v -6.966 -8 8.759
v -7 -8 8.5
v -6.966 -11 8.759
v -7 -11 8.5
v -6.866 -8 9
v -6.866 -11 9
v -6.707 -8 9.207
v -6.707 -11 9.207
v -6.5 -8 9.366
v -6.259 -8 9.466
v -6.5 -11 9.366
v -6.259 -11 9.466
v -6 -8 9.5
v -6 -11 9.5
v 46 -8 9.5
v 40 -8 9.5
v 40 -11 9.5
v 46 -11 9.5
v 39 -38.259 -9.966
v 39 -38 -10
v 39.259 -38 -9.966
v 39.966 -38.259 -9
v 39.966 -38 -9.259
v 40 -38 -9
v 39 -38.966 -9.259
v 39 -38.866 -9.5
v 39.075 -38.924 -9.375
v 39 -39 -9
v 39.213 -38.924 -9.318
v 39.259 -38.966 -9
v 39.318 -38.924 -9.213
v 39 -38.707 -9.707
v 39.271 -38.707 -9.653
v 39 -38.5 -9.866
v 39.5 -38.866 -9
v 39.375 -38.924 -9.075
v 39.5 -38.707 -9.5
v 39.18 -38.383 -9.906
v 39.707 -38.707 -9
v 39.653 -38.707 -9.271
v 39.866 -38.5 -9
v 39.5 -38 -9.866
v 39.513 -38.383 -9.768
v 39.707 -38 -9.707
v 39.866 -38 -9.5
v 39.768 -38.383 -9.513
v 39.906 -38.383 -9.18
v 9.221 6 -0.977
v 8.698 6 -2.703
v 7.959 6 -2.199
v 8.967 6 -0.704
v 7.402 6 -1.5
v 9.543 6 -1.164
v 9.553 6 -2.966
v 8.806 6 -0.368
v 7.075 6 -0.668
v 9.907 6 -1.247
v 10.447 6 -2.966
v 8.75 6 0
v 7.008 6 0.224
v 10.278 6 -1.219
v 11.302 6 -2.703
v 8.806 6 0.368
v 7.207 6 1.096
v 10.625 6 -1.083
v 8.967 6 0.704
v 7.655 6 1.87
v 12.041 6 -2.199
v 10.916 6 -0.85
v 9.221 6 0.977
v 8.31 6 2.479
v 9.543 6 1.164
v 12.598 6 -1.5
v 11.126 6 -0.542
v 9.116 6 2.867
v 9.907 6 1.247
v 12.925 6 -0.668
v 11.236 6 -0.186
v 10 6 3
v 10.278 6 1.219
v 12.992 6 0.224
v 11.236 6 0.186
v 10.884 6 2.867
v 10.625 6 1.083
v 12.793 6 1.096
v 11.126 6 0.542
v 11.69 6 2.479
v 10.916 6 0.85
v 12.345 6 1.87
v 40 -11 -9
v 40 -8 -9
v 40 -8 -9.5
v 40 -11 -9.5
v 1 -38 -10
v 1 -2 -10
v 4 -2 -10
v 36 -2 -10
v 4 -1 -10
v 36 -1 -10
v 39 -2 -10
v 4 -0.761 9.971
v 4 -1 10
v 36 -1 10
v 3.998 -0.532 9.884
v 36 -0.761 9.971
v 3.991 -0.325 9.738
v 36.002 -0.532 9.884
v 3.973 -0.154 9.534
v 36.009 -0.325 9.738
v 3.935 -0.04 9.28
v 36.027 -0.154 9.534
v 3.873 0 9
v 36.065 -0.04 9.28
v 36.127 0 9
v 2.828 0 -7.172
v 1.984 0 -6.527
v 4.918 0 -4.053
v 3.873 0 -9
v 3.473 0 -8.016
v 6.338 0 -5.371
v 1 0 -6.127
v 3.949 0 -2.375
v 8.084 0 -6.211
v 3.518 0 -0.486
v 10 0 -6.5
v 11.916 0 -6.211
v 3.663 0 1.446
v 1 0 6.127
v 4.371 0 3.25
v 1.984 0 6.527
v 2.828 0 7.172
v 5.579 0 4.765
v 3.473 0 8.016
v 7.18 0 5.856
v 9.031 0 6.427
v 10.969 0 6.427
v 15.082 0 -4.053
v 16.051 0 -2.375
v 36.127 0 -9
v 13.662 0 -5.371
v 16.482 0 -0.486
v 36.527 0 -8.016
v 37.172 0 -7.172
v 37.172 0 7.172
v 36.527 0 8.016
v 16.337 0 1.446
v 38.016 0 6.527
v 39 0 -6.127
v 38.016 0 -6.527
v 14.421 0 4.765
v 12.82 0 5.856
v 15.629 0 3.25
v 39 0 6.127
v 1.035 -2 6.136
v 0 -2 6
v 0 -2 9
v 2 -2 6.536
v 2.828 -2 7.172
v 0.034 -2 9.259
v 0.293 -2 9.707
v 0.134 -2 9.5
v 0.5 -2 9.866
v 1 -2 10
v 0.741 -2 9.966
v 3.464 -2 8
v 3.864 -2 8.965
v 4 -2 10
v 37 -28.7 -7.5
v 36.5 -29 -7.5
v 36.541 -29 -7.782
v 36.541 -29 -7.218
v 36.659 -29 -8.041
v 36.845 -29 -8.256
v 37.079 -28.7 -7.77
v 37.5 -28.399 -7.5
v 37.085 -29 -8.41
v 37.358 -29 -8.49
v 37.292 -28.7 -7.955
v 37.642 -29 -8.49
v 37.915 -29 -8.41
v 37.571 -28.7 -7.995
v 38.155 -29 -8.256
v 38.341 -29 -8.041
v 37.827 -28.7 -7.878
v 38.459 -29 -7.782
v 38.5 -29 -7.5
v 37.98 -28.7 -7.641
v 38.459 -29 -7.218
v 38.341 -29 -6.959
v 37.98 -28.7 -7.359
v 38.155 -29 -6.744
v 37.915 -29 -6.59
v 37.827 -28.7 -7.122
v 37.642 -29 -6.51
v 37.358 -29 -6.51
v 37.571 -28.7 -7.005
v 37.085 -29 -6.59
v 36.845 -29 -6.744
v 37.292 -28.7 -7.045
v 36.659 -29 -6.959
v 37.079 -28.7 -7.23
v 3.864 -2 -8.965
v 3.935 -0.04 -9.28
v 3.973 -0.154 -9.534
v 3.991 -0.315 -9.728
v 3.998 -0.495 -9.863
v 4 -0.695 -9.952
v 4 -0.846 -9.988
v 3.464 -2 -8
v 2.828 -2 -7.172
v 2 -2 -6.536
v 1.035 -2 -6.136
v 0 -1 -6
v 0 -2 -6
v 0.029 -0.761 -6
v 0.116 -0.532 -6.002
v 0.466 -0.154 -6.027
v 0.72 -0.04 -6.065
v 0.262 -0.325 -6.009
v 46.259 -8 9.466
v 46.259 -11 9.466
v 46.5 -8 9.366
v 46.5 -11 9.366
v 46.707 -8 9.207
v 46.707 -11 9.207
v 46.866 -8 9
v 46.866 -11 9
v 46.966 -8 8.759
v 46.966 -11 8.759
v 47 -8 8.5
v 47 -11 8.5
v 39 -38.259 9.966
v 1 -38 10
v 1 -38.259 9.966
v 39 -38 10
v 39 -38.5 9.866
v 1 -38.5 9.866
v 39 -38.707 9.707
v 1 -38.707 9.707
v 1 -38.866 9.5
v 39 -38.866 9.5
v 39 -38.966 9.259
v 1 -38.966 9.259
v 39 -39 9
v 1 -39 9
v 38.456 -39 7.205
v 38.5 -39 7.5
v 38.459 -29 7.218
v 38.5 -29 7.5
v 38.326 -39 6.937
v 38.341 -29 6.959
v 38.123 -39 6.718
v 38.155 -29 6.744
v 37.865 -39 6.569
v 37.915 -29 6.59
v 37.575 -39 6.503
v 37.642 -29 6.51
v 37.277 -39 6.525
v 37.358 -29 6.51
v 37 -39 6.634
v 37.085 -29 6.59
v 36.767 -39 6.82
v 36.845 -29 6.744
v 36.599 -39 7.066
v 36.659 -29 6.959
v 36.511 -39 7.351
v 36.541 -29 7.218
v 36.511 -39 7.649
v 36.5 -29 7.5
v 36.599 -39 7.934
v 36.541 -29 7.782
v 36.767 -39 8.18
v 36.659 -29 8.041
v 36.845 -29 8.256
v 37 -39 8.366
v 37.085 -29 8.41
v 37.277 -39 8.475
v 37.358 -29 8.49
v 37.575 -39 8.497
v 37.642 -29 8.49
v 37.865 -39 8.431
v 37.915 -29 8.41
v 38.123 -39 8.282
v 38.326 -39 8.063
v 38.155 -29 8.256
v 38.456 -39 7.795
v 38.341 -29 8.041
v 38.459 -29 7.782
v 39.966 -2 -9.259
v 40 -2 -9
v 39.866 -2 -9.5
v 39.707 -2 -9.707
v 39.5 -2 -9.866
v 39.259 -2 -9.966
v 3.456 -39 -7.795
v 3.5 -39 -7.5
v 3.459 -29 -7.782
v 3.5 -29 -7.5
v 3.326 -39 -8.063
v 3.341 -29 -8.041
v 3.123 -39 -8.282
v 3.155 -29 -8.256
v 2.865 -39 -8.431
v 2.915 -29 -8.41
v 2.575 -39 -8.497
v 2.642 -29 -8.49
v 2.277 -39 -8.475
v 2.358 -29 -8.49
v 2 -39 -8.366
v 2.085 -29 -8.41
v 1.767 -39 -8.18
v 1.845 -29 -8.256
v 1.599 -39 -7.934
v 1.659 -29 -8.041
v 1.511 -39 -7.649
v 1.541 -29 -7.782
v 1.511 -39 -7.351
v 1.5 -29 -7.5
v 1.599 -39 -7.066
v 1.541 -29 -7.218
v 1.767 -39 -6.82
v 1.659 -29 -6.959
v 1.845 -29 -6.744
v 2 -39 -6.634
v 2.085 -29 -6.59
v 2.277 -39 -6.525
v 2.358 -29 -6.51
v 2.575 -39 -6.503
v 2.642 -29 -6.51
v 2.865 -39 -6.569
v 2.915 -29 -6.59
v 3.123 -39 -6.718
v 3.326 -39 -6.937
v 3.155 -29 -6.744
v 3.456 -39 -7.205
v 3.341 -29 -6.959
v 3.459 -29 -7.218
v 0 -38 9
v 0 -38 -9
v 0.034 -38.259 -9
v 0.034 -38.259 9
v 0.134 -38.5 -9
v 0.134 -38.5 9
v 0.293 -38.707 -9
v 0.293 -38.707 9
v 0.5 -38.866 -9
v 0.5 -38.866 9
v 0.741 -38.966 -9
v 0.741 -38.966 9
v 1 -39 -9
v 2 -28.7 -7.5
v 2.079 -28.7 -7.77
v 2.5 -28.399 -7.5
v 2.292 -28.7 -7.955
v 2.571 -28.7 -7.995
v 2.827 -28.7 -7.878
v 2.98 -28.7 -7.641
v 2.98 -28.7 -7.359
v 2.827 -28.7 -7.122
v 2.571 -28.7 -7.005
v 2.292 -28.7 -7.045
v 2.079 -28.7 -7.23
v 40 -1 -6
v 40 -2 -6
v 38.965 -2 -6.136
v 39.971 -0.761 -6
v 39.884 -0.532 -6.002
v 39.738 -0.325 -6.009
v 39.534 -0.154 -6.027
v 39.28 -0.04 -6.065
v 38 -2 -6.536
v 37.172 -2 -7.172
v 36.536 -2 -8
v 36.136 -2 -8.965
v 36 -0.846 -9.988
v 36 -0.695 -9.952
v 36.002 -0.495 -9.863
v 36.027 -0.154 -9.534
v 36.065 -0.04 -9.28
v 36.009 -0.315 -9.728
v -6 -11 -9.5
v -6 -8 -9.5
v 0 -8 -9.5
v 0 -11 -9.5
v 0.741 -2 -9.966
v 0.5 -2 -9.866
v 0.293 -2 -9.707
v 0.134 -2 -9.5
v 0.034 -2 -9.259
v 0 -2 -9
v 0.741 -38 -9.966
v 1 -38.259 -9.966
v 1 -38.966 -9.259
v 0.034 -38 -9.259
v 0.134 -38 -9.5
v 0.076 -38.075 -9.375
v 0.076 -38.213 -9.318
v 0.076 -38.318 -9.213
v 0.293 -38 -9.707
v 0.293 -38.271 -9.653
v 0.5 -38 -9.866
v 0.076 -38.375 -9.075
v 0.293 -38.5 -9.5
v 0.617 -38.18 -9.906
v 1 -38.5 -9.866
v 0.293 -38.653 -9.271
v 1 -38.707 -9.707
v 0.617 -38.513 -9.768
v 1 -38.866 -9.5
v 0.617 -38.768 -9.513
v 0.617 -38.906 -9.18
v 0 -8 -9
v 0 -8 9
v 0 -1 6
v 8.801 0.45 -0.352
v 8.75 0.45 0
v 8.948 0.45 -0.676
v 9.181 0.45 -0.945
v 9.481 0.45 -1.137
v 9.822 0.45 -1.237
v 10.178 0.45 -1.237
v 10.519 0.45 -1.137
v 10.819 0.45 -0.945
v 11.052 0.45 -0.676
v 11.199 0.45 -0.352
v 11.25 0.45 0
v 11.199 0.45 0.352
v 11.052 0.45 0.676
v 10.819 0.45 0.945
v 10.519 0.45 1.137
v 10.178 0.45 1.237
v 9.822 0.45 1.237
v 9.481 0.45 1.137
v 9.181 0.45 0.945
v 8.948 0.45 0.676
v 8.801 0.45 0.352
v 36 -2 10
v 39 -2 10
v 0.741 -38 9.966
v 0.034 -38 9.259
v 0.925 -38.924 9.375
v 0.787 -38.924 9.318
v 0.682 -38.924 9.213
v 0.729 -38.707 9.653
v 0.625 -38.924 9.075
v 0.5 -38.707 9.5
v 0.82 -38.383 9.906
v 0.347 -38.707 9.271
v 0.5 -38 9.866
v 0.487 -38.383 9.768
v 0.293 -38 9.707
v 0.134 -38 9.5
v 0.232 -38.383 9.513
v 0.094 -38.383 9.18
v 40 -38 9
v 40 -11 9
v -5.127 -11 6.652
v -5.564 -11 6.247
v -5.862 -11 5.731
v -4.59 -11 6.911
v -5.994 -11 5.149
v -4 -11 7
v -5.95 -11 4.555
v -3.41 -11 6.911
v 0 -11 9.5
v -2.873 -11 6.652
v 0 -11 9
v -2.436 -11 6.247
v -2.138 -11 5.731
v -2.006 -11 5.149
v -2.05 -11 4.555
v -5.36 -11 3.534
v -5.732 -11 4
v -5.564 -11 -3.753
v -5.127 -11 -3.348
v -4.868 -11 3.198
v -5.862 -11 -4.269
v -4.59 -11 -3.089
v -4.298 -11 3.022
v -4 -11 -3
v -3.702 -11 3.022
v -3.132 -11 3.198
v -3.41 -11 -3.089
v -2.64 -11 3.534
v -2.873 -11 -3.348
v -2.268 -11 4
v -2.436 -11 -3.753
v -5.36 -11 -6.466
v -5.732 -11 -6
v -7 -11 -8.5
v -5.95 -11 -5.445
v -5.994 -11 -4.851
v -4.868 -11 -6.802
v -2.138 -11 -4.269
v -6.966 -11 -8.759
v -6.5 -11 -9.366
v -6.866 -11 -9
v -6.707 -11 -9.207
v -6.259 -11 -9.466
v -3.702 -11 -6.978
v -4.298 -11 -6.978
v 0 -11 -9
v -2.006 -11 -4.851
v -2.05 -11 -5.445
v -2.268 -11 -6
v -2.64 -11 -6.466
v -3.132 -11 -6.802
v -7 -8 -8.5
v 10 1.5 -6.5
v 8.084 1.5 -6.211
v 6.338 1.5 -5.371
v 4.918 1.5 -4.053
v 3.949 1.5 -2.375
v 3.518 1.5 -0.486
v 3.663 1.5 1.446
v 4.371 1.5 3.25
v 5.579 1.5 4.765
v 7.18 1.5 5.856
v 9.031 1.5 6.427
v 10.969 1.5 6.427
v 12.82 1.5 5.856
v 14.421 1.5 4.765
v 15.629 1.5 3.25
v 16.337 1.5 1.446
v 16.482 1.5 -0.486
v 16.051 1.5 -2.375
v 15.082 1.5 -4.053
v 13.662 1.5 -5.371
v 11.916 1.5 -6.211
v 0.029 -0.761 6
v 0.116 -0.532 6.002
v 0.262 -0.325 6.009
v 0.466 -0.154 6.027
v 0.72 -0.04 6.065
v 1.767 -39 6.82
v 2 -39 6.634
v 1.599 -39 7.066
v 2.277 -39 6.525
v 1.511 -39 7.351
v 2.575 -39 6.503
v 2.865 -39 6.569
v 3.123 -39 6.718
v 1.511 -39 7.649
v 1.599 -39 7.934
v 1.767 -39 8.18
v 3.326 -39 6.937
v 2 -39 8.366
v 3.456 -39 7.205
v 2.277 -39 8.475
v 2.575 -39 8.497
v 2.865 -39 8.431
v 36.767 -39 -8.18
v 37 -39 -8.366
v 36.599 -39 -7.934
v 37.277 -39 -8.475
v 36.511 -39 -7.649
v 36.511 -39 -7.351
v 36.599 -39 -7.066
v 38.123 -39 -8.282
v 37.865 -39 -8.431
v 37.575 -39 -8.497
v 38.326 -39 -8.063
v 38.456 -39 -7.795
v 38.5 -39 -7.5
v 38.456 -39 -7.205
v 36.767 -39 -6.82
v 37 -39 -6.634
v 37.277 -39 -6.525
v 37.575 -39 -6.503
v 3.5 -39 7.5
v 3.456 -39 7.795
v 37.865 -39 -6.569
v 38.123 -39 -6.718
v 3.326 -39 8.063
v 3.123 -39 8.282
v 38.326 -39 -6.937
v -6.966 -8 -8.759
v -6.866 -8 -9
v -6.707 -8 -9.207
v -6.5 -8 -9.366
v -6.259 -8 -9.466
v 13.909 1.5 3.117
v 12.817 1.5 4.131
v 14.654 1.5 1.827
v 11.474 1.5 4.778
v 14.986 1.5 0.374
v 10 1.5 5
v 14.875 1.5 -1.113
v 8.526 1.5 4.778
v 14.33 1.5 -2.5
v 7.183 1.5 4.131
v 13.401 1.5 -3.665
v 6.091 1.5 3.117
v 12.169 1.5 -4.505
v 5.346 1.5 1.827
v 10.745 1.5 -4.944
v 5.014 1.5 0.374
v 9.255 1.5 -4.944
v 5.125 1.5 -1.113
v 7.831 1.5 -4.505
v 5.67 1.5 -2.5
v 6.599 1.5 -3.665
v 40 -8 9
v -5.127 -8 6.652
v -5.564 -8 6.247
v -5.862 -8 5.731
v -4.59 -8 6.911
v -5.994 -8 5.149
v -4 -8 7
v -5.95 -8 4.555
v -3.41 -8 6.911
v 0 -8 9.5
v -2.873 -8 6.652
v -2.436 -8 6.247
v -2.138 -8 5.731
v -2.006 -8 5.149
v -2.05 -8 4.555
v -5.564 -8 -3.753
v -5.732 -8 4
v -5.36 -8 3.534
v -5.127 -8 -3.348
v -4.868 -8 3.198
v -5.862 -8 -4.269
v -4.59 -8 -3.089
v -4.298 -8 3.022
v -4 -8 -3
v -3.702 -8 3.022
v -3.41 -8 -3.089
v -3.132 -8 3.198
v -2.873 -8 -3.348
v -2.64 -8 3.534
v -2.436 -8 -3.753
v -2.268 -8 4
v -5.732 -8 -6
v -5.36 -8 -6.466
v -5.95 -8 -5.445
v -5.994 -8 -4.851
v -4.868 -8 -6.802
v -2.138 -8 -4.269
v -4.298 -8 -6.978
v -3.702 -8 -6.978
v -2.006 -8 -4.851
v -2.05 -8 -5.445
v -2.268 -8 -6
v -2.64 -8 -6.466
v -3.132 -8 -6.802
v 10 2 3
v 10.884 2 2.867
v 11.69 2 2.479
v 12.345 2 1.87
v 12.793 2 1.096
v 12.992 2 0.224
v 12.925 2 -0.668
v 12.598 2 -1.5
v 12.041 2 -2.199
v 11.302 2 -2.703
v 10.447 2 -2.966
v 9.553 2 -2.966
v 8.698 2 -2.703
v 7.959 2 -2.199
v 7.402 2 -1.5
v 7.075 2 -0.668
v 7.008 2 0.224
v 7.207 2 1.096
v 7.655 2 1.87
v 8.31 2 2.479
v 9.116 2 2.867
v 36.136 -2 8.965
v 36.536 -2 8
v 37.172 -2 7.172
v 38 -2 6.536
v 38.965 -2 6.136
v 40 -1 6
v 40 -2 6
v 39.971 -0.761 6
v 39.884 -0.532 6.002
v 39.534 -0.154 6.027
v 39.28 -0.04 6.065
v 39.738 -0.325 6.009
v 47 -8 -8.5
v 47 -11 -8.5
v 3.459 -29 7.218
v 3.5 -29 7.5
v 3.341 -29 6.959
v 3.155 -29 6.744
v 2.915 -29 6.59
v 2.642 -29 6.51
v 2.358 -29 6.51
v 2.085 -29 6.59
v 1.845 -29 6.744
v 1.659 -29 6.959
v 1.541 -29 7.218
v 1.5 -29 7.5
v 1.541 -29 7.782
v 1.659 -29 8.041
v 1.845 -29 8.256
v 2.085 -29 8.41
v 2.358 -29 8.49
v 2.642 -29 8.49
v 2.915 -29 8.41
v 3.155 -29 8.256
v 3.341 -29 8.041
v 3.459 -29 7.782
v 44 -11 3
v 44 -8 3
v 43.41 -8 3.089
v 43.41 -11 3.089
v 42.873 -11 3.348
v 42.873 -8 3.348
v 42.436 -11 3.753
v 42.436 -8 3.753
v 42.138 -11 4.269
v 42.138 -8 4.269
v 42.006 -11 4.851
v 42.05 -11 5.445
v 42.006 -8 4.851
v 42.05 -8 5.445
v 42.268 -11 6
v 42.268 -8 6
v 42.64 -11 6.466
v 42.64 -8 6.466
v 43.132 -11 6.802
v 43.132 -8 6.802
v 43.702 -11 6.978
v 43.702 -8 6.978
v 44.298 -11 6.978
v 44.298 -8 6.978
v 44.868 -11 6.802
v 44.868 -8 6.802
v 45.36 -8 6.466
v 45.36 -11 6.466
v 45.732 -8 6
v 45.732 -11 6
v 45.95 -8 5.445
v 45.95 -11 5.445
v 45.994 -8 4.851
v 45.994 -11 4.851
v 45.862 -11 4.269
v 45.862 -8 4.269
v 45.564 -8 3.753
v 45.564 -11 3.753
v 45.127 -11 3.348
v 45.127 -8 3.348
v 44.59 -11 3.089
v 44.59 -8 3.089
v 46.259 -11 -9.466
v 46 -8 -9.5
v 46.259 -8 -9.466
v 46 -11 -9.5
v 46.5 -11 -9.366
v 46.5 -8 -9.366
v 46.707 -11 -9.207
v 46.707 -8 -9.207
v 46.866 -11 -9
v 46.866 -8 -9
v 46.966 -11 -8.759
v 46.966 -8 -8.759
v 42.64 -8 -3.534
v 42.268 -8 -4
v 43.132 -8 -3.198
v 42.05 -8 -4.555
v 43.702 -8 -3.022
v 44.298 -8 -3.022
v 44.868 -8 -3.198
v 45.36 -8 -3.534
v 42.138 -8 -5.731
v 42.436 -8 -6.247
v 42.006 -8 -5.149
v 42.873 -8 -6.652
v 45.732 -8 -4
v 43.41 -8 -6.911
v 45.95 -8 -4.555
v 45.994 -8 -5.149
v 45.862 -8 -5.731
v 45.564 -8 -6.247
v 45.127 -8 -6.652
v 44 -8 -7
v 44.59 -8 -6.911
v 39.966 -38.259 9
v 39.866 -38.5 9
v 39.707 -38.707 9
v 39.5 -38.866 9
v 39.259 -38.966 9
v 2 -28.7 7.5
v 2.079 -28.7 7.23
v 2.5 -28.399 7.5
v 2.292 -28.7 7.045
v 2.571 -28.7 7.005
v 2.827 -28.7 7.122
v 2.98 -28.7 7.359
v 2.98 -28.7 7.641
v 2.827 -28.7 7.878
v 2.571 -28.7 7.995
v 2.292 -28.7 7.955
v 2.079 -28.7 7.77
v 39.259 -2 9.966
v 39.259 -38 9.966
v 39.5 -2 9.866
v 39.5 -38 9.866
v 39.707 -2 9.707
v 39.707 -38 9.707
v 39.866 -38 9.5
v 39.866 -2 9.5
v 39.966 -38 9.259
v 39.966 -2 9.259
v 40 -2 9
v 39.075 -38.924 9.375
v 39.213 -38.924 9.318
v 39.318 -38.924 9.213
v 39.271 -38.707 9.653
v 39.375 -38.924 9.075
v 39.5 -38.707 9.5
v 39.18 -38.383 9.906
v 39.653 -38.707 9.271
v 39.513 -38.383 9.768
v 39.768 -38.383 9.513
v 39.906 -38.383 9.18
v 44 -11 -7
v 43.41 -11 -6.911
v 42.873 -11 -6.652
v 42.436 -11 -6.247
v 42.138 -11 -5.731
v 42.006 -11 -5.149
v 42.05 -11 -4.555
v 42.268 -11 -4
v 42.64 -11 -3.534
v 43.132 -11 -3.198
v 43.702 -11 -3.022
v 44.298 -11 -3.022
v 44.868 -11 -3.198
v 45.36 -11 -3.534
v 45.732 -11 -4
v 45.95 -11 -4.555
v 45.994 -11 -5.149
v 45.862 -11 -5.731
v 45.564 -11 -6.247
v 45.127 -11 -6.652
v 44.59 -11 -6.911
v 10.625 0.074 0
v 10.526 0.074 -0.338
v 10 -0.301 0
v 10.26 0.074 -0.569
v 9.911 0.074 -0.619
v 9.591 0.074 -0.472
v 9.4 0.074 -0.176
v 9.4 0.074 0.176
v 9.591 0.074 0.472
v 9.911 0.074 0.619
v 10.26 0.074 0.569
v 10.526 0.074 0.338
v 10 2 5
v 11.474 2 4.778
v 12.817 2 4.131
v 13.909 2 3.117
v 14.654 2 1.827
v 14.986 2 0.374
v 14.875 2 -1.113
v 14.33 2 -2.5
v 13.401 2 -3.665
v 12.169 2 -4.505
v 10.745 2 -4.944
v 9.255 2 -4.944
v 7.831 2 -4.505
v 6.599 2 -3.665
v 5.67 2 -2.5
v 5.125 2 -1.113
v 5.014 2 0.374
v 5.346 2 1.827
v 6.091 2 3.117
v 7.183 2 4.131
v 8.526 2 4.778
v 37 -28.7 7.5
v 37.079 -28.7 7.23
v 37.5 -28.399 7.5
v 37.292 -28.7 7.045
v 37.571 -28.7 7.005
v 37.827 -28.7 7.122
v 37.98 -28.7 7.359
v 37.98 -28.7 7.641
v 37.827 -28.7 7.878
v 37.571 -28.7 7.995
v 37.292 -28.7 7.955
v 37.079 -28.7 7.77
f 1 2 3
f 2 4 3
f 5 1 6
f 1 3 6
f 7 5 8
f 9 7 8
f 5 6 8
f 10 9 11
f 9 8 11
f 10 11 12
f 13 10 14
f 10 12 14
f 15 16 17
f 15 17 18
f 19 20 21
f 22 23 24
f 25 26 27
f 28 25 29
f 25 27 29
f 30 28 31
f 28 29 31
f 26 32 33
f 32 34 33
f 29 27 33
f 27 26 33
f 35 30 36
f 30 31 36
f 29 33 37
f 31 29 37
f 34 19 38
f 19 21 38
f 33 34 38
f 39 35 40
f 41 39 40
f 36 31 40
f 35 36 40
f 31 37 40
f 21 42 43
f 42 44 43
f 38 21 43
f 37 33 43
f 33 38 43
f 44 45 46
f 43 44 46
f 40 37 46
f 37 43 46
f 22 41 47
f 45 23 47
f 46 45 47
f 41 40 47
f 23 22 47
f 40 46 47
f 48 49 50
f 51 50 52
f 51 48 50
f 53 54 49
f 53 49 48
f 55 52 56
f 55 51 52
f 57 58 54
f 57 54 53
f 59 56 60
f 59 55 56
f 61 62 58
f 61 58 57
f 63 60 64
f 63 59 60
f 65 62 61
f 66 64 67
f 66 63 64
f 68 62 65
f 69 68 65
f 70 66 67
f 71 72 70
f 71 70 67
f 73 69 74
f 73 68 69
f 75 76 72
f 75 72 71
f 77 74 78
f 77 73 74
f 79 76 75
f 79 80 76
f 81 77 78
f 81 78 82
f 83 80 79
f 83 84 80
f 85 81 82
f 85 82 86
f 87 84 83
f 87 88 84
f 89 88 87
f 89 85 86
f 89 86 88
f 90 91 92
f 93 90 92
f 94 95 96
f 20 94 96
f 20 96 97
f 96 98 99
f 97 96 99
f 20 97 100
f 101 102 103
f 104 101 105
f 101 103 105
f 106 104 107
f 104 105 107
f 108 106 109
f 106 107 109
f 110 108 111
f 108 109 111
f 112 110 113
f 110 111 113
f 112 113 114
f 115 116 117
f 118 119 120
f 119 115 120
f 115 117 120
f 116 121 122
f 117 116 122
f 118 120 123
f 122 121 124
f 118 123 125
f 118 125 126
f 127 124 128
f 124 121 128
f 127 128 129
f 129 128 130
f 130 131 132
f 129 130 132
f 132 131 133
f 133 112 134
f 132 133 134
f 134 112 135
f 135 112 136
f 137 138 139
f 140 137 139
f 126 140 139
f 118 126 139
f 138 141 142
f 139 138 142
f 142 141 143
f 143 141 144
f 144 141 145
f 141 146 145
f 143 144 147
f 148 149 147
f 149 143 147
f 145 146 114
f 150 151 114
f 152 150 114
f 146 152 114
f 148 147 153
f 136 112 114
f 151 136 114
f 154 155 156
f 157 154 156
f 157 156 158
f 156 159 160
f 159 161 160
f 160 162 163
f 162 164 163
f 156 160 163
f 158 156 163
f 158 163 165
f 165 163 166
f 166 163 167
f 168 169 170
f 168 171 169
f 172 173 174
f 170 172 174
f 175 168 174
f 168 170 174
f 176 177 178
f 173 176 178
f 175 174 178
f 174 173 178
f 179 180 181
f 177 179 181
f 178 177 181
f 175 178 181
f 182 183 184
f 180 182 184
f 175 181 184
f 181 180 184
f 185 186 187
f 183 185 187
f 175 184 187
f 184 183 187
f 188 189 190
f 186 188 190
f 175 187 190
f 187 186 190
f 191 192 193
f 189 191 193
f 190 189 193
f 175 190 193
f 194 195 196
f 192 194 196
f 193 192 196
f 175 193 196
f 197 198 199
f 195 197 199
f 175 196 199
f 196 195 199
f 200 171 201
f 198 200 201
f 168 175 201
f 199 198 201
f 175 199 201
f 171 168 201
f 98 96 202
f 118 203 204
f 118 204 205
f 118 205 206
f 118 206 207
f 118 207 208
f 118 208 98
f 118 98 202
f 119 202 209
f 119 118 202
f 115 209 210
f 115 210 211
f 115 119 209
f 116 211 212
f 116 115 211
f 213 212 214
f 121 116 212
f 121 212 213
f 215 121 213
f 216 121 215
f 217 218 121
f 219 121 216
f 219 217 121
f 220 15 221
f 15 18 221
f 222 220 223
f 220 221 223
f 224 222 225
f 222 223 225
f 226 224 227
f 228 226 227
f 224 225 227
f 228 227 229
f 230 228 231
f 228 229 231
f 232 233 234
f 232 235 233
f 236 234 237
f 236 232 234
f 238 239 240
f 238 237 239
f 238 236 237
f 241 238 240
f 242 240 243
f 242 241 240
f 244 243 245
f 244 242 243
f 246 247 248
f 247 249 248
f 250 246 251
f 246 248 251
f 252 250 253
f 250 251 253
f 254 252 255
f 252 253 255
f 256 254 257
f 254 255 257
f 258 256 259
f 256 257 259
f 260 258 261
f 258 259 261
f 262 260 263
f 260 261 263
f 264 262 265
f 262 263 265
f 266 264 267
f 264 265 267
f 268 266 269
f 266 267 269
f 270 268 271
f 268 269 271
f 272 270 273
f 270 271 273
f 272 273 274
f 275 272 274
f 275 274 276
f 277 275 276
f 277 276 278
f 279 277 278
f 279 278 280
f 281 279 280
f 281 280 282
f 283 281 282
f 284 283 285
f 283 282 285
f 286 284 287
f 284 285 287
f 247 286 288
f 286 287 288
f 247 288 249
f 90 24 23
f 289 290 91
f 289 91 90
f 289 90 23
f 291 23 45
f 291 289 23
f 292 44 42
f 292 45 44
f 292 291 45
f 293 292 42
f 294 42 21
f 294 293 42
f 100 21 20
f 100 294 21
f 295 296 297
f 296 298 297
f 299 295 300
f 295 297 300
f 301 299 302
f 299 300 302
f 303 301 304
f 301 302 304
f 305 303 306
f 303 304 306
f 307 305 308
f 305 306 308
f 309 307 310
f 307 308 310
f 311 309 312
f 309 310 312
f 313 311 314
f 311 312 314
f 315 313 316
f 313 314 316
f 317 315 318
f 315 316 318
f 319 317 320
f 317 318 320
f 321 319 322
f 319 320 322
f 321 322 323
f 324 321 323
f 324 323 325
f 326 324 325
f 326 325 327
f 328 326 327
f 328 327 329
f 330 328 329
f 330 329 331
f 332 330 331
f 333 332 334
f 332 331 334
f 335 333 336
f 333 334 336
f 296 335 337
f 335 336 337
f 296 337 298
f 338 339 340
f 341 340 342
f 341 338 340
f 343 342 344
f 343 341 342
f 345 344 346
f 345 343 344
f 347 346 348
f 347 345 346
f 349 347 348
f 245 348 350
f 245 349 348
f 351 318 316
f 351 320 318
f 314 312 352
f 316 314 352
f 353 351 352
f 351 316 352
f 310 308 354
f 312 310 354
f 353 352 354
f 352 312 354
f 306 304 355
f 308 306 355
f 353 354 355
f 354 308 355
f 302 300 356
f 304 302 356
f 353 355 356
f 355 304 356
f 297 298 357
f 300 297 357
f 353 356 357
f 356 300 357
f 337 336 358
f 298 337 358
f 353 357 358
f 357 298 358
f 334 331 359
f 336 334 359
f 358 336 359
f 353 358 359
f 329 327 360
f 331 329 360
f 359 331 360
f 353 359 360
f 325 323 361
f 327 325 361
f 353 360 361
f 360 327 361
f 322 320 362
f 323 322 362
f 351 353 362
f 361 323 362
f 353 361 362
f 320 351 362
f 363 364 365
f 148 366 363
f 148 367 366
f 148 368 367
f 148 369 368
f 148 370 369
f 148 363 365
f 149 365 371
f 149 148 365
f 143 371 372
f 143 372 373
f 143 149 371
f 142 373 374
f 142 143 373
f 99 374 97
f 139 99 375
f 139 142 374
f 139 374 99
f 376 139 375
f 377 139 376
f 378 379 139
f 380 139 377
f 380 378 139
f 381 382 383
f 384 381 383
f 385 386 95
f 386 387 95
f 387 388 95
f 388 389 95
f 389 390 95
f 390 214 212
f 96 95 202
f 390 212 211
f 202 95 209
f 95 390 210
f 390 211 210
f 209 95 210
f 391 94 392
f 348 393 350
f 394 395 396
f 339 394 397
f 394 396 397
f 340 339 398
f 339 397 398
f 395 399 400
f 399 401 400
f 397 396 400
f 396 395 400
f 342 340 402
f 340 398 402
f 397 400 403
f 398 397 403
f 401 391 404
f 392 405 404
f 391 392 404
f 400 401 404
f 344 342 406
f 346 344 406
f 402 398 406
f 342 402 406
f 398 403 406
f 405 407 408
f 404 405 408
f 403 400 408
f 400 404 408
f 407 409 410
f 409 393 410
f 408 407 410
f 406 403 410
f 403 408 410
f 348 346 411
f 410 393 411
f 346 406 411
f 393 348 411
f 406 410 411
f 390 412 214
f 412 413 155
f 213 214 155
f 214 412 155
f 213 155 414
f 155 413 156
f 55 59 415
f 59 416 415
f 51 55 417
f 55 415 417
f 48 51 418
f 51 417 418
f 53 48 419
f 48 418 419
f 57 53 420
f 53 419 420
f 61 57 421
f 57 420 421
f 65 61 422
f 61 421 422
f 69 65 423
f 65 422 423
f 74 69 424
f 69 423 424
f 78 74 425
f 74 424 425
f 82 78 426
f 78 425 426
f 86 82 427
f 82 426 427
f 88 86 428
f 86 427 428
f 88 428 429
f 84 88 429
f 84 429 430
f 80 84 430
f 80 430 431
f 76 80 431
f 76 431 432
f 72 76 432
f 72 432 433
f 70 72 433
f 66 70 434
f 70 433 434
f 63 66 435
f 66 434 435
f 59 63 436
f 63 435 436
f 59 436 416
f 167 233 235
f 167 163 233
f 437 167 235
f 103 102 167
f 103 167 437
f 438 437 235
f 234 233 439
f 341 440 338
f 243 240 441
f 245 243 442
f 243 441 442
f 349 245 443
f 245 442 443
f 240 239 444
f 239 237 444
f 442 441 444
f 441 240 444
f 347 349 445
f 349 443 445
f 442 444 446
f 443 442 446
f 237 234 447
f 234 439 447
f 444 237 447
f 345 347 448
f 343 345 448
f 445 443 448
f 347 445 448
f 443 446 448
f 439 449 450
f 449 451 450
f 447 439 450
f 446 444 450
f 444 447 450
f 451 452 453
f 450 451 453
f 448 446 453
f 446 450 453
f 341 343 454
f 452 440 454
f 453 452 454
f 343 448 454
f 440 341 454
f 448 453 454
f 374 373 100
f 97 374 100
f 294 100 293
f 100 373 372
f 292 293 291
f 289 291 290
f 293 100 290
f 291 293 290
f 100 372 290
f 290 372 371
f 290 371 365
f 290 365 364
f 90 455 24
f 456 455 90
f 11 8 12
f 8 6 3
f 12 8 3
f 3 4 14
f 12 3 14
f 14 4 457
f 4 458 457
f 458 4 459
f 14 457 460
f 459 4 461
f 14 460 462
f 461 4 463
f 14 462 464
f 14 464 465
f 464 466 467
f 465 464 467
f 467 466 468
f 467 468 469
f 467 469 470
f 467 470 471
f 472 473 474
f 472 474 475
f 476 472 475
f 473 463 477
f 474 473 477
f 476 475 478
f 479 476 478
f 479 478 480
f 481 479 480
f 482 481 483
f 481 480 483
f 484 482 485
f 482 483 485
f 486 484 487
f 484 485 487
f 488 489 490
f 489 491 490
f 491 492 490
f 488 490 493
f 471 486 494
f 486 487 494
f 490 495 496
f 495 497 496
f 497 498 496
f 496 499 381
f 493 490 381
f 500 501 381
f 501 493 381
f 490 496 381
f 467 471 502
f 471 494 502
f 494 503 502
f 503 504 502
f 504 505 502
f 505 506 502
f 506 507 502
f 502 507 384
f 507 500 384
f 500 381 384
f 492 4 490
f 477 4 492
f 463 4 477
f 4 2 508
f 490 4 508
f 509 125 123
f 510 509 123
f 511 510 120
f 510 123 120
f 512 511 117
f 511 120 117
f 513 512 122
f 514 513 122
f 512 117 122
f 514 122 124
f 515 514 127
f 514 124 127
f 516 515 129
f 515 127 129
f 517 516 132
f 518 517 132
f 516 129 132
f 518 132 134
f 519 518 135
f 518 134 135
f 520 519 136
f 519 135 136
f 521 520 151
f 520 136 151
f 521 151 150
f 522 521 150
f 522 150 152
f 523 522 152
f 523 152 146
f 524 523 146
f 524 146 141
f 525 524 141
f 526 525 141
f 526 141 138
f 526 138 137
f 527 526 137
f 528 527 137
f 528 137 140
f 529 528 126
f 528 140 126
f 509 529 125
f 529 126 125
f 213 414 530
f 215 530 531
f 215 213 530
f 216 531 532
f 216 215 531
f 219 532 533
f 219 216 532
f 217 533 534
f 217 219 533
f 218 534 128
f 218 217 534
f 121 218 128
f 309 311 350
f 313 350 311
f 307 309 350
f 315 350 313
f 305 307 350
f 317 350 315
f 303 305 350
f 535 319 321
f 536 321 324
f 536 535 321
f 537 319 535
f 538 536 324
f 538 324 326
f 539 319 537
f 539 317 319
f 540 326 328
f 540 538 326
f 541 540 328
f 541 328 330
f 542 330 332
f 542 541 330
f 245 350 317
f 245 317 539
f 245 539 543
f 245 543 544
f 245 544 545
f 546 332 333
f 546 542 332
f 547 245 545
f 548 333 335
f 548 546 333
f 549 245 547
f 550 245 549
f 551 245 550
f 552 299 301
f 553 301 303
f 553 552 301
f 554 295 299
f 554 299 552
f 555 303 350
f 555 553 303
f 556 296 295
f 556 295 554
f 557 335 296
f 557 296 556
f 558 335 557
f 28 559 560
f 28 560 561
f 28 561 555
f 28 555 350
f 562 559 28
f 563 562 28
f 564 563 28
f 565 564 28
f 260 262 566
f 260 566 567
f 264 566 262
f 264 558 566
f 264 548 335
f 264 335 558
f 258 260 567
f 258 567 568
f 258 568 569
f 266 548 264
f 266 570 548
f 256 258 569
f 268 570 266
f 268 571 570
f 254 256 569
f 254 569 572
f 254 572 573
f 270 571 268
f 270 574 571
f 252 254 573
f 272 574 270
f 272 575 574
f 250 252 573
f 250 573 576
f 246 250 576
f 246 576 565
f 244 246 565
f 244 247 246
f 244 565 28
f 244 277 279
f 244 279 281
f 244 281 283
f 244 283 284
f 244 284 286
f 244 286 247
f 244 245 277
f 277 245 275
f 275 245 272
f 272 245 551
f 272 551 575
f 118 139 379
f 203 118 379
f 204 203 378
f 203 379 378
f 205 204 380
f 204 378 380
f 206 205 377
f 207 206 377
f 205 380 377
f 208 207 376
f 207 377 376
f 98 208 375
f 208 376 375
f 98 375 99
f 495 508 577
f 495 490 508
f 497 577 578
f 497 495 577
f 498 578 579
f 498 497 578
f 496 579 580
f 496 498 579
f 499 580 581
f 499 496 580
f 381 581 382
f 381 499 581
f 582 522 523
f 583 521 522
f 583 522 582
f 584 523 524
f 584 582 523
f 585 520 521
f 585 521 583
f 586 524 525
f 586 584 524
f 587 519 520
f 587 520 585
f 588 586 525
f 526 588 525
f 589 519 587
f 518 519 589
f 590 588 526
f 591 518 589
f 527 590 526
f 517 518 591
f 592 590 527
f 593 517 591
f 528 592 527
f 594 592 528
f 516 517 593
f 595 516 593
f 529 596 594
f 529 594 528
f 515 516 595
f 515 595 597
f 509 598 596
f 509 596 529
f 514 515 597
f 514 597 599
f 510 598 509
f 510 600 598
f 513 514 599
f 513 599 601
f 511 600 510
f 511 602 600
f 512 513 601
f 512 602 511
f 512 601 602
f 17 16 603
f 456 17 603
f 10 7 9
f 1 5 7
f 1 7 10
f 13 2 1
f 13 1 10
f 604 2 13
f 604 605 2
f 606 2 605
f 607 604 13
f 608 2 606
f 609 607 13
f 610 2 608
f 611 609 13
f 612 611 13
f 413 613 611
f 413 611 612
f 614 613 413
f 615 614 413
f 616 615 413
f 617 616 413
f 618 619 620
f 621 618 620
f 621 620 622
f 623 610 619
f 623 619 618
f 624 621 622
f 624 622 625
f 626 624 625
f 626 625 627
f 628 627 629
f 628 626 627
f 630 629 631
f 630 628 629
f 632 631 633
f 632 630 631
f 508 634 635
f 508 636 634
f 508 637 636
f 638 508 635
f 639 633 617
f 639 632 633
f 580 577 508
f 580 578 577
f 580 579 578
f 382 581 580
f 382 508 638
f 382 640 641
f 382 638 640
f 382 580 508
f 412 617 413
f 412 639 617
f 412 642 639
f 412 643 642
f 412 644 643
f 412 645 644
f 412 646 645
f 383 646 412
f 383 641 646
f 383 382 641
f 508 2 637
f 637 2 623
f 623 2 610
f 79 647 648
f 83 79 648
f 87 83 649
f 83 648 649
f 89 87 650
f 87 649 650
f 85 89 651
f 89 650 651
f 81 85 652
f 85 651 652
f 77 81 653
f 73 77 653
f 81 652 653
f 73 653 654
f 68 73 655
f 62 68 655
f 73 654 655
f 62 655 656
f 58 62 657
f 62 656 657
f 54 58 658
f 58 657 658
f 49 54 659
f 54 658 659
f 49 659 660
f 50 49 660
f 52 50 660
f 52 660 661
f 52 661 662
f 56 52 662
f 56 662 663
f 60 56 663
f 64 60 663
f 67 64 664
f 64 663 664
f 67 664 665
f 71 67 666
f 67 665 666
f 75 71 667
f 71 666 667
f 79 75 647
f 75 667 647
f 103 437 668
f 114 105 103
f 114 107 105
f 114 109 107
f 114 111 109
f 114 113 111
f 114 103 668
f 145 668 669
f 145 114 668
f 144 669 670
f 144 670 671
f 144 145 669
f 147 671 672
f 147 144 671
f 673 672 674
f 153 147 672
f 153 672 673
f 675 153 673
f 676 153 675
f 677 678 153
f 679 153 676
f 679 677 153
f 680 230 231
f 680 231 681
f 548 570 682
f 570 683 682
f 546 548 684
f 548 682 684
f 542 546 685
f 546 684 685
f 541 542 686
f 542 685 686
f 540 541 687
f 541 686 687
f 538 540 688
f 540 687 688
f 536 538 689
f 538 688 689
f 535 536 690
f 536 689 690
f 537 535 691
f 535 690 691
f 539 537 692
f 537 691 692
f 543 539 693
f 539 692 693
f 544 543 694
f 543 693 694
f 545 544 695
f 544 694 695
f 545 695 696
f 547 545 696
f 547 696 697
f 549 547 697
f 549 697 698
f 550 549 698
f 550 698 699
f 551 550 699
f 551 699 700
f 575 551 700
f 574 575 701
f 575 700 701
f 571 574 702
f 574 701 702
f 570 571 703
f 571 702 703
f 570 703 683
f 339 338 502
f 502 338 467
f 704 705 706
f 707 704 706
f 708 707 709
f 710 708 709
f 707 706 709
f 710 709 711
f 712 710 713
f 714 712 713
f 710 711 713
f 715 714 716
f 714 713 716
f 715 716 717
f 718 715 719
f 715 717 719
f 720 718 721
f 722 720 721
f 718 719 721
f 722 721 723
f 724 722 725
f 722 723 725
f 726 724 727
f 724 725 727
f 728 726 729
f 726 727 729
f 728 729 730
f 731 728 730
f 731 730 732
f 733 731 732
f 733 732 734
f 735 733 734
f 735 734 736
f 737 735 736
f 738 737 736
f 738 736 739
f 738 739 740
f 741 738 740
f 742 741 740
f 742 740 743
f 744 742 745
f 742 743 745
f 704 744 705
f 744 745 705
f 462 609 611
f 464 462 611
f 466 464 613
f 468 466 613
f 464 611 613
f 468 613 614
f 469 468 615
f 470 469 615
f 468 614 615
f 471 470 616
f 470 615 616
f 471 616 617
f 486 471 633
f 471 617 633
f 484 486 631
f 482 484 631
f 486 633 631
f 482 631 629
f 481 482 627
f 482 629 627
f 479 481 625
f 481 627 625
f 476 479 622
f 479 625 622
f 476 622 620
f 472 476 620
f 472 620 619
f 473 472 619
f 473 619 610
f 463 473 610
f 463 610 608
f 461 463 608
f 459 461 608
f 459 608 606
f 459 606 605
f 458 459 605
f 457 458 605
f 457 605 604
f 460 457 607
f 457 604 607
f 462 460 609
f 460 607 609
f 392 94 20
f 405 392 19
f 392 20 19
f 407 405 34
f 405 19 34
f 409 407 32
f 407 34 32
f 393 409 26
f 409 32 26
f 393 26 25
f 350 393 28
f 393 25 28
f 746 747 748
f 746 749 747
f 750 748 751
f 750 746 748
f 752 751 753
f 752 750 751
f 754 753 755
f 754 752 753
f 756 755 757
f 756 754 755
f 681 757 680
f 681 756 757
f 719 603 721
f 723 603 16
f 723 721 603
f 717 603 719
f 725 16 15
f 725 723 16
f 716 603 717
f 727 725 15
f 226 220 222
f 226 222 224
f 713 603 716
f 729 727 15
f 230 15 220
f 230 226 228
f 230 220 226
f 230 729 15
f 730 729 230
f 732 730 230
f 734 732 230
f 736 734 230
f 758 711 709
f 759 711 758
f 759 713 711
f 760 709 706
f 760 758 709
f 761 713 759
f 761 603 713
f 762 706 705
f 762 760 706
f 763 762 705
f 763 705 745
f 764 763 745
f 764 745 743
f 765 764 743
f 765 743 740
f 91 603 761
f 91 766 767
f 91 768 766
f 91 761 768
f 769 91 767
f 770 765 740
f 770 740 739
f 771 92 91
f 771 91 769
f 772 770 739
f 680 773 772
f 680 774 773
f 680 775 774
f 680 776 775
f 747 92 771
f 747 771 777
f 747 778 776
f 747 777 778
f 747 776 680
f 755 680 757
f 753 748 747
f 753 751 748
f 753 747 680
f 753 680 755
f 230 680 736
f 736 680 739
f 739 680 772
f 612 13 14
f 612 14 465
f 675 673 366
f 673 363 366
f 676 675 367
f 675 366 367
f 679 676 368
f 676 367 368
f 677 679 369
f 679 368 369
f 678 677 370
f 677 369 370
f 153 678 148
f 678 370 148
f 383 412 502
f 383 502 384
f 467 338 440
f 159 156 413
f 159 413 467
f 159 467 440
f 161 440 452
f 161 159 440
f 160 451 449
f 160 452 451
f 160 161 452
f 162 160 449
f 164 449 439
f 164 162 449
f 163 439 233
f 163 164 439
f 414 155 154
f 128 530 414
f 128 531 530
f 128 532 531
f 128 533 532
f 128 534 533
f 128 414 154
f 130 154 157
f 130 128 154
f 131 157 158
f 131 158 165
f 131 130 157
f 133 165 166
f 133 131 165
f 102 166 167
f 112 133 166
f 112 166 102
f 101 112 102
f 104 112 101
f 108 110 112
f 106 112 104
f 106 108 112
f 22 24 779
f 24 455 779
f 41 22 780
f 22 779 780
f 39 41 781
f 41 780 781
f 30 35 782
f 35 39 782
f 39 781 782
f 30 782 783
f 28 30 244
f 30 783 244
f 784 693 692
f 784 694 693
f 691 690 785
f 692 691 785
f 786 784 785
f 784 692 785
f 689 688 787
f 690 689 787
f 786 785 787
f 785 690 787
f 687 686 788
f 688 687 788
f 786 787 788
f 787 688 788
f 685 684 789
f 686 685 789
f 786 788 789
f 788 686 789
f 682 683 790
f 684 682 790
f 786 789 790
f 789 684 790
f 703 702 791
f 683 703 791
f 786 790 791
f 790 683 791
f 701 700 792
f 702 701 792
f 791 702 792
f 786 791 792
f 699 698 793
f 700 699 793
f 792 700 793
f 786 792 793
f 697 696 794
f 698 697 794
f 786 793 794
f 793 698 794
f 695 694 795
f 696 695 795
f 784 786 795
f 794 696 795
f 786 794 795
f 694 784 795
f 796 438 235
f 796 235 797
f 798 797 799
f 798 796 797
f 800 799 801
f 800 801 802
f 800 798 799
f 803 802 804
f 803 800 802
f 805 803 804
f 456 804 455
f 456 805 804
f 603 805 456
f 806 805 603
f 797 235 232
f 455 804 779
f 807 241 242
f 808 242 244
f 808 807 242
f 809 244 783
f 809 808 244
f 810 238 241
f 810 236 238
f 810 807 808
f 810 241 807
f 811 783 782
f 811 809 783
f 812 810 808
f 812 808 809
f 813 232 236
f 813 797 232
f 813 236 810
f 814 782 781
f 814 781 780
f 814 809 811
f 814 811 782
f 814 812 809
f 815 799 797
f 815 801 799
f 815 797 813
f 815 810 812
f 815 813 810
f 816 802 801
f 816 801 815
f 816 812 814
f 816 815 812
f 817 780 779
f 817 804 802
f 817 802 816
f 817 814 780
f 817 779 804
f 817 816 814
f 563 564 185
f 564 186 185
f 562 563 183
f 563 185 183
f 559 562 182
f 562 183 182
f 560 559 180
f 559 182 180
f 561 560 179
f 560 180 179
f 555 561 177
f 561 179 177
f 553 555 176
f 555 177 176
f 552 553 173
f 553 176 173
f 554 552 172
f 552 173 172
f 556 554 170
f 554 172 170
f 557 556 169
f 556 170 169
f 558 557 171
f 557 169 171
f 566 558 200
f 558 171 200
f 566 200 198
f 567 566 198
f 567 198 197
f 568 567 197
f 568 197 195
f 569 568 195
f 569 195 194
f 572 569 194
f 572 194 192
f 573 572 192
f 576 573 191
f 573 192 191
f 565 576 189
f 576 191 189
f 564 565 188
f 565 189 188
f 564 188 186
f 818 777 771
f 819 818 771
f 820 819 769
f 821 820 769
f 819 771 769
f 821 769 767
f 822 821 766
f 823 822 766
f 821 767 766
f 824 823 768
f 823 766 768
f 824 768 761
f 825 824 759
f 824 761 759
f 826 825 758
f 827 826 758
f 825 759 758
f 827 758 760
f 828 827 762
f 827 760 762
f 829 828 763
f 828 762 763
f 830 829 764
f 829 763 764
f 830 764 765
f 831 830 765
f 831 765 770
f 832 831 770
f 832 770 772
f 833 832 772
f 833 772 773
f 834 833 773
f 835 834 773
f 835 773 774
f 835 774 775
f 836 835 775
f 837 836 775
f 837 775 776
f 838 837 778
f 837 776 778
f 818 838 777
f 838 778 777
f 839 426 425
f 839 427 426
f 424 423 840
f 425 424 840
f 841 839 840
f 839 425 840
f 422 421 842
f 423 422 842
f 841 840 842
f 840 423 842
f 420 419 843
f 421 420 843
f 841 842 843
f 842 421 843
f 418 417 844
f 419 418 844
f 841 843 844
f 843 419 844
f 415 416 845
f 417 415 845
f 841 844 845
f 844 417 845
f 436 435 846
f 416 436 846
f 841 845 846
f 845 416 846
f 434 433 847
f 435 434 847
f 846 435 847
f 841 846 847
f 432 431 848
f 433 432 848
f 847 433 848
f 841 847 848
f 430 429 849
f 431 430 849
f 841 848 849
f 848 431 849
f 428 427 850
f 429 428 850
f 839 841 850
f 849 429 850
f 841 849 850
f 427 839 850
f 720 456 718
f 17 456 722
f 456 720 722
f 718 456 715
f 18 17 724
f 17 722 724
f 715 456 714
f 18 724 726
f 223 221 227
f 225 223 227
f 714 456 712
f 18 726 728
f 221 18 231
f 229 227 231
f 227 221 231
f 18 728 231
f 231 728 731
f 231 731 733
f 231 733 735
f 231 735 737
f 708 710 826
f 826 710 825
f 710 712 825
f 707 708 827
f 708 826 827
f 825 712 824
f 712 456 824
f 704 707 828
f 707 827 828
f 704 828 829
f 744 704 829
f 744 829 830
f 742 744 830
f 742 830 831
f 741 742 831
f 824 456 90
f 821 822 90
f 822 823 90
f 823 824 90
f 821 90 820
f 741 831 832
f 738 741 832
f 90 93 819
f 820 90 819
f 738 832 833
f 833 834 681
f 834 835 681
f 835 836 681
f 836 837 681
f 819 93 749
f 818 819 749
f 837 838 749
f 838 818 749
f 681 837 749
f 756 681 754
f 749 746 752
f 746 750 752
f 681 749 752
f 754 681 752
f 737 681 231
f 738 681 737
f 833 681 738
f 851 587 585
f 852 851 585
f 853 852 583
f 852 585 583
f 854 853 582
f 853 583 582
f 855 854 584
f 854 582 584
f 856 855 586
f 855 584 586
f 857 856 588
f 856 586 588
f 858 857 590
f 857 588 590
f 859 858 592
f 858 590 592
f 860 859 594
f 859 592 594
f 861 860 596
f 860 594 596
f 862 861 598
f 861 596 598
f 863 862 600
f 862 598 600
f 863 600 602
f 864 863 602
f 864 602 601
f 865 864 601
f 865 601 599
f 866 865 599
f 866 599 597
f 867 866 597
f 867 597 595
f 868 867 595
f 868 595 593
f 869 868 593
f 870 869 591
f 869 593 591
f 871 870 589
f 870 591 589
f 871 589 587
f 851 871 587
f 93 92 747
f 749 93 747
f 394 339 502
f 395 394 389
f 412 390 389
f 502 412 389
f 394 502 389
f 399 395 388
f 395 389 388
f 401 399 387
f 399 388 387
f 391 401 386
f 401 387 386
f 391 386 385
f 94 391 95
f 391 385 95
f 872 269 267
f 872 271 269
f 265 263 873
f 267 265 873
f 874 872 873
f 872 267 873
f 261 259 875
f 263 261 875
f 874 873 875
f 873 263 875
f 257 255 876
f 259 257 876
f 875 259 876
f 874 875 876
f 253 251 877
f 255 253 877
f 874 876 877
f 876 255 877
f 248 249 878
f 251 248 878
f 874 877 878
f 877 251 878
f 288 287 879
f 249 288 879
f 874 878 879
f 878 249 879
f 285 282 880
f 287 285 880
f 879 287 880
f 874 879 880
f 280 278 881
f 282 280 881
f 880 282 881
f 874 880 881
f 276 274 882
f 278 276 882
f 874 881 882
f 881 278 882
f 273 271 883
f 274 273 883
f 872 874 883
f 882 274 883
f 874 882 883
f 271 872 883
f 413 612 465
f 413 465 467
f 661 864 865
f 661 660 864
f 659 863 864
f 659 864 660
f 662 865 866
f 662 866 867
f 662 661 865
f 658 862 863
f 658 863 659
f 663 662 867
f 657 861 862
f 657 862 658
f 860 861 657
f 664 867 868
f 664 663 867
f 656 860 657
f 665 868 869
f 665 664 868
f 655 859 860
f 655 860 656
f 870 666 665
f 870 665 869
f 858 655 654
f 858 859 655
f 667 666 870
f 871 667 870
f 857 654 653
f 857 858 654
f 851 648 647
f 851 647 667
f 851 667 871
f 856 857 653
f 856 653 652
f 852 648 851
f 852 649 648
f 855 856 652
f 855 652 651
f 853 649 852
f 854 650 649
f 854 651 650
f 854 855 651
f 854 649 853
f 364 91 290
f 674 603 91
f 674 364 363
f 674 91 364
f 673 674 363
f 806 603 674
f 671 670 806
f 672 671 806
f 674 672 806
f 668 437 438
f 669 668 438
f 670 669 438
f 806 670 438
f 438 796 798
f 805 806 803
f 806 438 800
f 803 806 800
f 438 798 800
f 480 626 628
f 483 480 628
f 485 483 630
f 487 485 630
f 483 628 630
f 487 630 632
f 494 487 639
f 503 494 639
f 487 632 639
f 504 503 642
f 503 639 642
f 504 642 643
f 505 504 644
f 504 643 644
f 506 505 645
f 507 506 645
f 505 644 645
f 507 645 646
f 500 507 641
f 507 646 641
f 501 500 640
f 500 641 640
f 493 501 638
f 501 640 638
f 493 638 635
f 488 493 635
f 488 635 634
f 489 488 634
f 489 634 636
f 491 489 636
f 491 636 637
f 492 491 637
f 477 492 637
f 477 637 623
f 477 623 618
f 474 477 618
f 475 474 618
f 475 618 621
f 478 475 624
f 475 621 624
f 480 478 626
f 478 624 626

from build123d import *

# Parameters (mm, degrees)
SKETCH_2_W                = 40
SKETCH_2_H                = 39
EXTRUDE_1_DEPTH           = 10
FILLET_1_R                = 1
SKETCH_6_R                = 4
CUT_EXTRUDE_1_DEPTH       = 2
HOLE_WIZARD_2_0_2_2_D     = 2
HOLE_WIZARD_2_0_2_2_DEPTH = 10
HOLE_WIZARD_2_0_2_2_TIP   = 0.600860619
EXTRUDE_START             = -8
SKETCH_16_W               = 7
SKETCH_16_H               = 19
SKETCH_16_R               = 2
EXTRUDE_2_DEPTH           = 3
SKETCH_17_R               = 6.5
EXTRUDE_3_DEPTH           = 1.5
SKETCH_18_R               = 5
EXTRUDE_4_DEPTH           = 0.5
SKETCH_19_R               = 3
EXTRUDE_5_DEPTH           = 4
FILLET_2_R                = 1
HOLE_WIZARD_M3_1_D        = 2.5
HOLE_WIZARD_M3_1_DEPTH    = 5.55
HOLE_WIZARD_M3_1_TIP      = 0.751075774


with BuildPart() as part:
    # 草图2 → 凸台-拉伸1 (new, symmetric)
    with BuildSketch(Plane.XY):
        with Locations((20, -19.5)):
            Rectangle(SKETCH_2_W, SKETCH_2_H)
    extrude(amount=EXTRUDE_1_DEPTH, both=True)

    # 圆角1
    fillet_1_edges = [part.edges().sort_by_distance(p)[0] for p in [
        (40, -19.5, 10),
        (20, 0, 10),
        (0, -19.5, 10),
        (20, 0, -10),
        (40, -19.5, -10),
        (20, -39, -10),
        (0, -19.5, -10),
        (20, -39, 10),
        (0, 0, 0),
        (40, 0, 0),
        (40, -39, 0),
        (0, -39, 0),
    ]]
    fillet(fillet_1_edges, radius=FILLET_1_R)

    # 草图6 → 切除-拉伸1 (cut)
    with BuildSketch(Plane.XZ):
        with Locations((0, 10)):
            Circle(SKETCH_6_R)
        with Locations((40, 10)):
            Circle(SKETCH_6_R)
        with Locations((40, -10)):
            Circle(SKETCH_6_R)
        with Locations((0, -10)):
            Circle(SKETCH_6_R)
    extrude(amount=CUT_EXTRUDE_1_DEPTH, mode=Mode.SUBTRACT)

    # Ø2.0 (2) 直径孔2
    with Locations(Plane(origin=(0, -39, 0), x_dir=(-1, 0, 0), z_dir=(0, -1, 0))):
        with Locations((-37.5, 7.5), (-37.5, -7.5), (-2.5, 7.5), (-2.5, -7.5)):
            Hole(HOLE_WIZARD_2_0_2_2_D / 2, depth=HOLE_WIZARD_2_0_2_2_DEPTH)
            with Locations((0, 0, -(HOLE_WIZARD_2_0_2_2_DEPTH + HOLE_WIZARD_2_0_2_2_TIP / 2))):  # 118° drill point
                Cone(0, HOLE_WIZARD_2_0_2_2_D / 2, HOLE_WIZARD_2_0_2_2_TIP, mode=Mode.SUBTRACT)

    # 草图16 → 凸台-拉伸2 (add)
    # profile 1 of 2: a face of its own
    with BuildSketch(Plane(origin=(0, 0, 0), x_dir=(1, 0, 0), z_dir=(0, 1, 0)).offset(EXTRUDE_START)):
        with Locations((-3.5, 0)):
            Rectangle(SKETCH_16_W, SKETCH_16_H)
        with Locations(Location((-4, -5, 0), (0, 0, 270))):
            Circle(SKETCH_16_R, mode=Mode.SUBTRACT)
        with Locations(Location((-4, 5, 0), (0, 0, 270))):
            Circle(SKETCH_16_R, mode=Mode.SUBTRACT)
    # profile 2 of 2: a face of its own
    with BuildSketch(Plane(origin=(0, 0, 0), x_dir=(1, 0, 0), z_dir=(0, 1, 0)).offset(EXTRUDE_START)):
        with Locations((43.5, 0)):
            Rectangle(SKETCH_16_W, SKETCH_16_H)
        with Locations(Location((44, 5, 0), (0, 0, 90))):
            Circle(SKETCH_16_R, mode=Mode.SUBTRACT)
        with Locations(Location((44, -5, 0), (0, 0, 90))):
            Circle(SKETCH_16_R, mode=Mode.SUBTRACT)
    extrude(amount=-EXTRUDE_2_DEPTH)

    # 草图17 → 凸台-拉伸3 (add)
    with BuildSketch(Plane(origin=(0, 0, 0), x_dir=(1, 0, 0), z_dir=(0, 1, 0))):
        with Locations(Location((10, 0, 0), (0, 0, 90))):
            Circle(SKETCH_17_R)
    extrude(amount=EXTRUDE_3_DEPTH)

    # 草图18 → 凸台-拉伸4 (add)
    with BuildSketch(Plane(origin=(0, 1.5, 0), x_dir=(1, 0, 0), z_dir=(0, 1, 0))):
        with Locations(Location((10, 0, 0), (0, 0, 270))):
            Circle(SKETCH_18_R)
    extrude(amount=EXTRUDE_4_DEPTH)

    # 草图19 → 凸台-拉伸5 (add)
    with BuildSketch(Plane(origin=(0, 2, 0), x_dir=(1, 0, 0), z_dir=(0, 1, 0))):
        with Locations(Location((10, 0, 0), (0, 0, 270))):
            Circle(SKETCH_19_R)
    extrude(amount=EXTRUDE_5_DEPTH)

    # 圆角2
    fillet_2_edges = [part.edges().sort_by_distance(p)[0] for p in [
        (-7, -9.5, 9.5),
        (-7, -9.5, -9.5),
        (47, -9.5, 9.5),
        (47, -9.5, -9.5),
    ]]
    fillet(fillet_2_edges, radius=FILLET_2_R)

    # M3 螺纹孔1
    with Locations(Plane(origin=(0, 6, 0), x_dir=(1, 0, 0), z_dir=(0, 1, 0))):
        with Locations((10, 0)):
            Hole(HOLE_WIZARD_M3_1_D / 2, depth=HOLE_WIZARD_M3_1_DEPTH)
            with Locations((0, 0, -(HOLE_WIZARD_M3_1_DEPTH + HOLE_WIZARD_M3_1_TIP / 2))):  # 118° drill point
                Cone(0, HOLE_WIZARD_M3_1_D / 2, HOLE_WIZARD_M3_1_TIP, mode=Mode.SUBTRACT)


solid = part.part
